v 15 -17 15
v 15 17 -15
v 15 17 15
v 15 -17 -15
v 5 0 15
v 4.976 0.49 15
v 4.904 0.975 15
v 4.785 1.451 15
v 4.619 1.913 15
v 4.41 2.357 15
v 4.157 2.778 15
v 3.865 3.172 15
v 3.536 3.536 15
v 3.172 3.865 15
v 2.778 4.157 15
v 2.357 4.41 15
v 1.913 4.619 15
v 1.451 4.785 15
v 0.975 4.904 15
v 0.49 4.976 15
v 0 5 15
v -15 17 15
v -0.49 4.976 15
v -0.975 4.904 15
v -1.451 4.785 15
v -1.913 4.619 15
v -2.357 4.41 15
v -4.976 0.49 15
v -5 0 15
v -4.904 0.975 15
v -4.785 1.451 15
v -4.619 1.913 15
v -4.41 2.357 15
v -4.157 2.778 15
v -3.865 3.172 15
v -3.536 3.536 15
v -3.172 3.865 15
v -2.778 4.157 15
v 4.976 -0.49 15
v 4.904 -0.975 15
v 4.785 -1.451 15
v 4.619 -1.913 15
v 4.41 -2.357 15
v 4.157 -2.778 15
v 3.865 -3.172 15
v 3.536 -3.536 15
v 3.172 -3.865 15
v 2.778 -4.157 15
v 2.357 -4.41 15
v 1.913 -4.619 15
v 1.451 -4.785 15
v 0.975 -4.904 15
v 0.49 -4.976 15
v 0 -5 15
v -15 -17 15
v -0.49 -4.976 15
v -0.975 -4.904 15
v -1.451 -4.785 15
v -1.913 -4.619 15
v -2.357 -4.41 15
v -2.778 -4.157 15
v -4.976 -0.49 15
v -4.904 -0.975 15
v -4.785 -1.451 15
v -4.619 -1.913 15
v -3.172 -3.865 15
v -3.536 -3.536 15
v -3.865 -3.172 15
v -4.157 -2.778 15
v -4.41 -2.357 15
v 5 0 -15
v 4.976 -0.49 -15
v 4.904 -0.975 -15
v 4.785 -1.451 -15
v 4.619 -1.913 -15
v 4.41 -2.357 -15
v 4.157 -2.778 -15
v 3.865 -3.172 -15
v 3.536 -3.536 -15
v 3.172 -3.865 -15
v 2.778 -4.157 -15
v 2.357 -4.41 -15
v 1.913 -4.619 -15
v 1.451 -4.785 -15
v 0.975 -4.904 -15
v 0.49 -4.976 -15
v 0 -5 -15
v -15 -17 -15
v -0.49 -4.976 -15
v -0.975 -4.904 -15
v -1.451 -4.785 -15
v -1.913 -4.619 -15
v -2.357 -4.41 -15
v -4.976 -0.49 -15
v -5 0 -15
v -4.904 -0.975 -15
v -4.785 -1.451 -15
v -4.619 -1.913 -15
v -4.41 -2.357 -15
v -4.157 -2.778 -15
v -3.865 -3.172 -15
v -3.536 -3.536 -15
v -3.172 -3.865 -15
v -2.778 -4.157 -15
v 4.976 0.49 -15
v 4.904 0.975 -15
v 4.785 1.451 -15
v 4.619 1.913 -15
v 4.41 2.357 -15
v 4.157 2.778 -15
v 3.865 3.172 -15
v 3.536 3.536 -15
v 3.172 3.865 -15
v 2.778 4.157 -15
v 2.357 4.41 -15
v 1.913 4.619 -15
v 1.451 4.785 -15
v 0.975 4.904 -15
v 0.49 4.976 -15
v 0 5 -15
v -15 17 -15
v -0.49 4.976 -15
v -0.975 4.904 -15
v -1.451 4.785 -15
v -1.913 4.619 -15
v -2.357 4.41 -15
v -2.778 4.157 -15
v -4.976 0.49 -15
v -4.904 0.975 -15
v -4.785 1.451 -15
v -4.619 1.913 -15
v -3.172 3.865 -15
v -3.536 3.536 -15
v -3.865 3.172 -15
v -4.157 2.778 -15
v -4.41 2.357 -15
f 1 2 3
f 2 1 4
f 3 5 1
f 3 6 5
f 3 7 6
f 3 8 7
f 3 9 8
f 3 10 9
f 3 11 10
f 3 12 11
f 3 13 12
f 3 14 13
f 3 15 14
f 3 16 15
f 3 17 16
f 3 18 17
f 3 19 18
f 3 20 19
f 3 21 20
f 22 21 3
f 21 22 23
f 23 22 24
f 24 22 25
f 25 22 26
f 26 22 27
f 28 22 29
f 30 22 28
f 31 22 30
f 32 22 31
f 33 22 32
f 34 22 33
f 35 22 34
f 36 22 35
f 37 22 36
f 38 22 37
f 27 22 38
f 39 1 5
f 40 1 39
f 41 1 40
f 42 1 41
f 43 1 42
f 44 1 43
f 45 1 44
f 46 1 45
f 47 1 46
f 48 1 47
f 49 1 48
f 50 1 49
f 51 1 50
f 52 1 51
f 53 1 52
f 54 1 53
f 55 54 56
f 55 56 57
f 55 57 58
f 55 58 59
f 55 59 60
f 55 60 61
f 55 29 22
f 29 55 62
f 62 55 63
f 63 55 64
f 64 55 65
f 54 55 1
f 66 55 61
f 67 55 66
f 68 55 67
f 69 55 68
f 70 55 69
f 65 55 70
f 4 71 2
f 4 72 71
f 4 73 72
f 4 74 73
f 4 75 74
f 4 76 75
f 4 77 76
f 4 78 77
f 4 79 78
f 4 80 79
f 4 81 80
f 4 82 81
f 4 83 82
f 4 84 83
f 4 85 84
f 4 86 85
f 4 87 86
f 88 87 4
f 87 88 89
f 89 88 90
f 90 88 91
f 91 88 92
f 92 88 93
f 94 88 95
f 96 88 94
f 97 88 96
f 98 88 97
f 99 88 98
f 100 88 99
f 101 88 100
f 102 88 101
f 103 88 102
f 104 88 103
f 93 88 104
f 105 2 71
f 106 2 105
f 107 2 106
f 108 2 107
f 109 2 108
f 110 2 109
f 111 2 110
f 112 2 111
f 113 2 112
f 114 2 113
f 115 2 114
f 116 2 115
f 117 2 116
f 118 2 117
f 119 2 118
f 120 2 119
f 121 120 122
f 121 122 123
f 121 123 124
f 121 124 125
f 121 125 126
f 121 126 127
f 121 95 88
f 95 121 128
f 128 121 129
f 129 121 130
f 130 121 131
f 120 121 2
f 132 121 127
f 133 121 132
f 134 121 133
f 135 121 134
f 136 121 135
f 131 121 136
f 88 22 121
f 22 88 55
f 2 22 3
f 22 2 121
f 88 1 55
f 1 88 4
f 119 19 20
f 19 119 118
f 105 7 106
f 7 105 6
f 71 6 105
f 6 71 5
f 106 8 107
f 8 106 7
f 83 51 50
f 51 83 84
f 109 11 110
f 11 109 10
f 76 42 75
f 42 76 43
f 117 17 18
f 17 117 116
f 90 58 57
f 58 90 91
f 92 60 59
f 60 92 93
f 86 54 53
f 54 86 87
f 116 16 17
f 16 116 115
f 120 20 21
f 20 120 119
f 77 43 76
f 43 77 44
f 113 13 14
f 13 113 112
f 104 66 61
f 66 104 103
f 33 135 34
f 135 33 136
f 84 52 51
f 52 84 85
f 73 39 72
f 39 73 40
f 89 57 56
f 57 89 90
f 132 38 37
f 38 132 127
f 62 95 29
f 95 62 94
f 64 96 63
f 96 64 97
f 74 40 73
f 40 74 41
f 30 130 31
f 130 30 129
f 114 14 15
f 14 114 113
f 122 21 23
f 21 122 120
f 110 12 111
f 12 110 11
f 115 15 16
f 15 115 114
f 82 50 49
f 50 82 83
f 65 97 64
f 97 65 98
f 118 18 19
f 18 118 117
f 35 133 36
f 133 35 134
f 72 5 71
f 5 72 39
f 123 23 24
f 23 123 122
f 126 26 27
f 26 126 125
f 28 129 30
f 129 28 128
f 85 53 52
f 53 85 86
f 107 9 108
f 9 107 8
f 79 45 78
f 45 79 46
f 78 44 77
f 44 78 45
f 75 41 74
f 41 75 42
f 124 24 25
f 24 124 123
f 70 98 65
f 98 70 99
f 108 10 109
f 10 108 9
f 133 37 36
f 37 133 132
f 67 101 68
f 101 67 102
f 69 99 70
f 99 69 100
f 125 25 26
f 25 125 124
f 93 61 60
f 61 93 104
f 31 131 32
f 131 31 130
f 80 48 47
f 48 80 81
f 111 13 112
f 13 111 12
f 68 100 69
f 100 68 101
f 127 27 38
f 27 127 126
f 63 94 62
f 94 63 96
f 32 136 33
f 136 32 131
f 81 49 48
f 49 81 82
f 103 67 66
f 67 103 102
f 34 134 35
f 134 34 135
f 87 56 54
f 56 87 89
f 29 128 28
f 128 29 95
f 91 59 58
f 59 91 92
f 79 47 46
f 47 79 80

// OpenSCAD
module leadscrew_nut_housing() {
    difference() {
        // Main block
        cube([30, 34, 30], center=true);
        
        // Leadscrew hole
        translate([0, 0, 0])
            cylinder(h=30, r=5, center=true, $fn=64);
    }
}

leadscrew_nut_housing();
